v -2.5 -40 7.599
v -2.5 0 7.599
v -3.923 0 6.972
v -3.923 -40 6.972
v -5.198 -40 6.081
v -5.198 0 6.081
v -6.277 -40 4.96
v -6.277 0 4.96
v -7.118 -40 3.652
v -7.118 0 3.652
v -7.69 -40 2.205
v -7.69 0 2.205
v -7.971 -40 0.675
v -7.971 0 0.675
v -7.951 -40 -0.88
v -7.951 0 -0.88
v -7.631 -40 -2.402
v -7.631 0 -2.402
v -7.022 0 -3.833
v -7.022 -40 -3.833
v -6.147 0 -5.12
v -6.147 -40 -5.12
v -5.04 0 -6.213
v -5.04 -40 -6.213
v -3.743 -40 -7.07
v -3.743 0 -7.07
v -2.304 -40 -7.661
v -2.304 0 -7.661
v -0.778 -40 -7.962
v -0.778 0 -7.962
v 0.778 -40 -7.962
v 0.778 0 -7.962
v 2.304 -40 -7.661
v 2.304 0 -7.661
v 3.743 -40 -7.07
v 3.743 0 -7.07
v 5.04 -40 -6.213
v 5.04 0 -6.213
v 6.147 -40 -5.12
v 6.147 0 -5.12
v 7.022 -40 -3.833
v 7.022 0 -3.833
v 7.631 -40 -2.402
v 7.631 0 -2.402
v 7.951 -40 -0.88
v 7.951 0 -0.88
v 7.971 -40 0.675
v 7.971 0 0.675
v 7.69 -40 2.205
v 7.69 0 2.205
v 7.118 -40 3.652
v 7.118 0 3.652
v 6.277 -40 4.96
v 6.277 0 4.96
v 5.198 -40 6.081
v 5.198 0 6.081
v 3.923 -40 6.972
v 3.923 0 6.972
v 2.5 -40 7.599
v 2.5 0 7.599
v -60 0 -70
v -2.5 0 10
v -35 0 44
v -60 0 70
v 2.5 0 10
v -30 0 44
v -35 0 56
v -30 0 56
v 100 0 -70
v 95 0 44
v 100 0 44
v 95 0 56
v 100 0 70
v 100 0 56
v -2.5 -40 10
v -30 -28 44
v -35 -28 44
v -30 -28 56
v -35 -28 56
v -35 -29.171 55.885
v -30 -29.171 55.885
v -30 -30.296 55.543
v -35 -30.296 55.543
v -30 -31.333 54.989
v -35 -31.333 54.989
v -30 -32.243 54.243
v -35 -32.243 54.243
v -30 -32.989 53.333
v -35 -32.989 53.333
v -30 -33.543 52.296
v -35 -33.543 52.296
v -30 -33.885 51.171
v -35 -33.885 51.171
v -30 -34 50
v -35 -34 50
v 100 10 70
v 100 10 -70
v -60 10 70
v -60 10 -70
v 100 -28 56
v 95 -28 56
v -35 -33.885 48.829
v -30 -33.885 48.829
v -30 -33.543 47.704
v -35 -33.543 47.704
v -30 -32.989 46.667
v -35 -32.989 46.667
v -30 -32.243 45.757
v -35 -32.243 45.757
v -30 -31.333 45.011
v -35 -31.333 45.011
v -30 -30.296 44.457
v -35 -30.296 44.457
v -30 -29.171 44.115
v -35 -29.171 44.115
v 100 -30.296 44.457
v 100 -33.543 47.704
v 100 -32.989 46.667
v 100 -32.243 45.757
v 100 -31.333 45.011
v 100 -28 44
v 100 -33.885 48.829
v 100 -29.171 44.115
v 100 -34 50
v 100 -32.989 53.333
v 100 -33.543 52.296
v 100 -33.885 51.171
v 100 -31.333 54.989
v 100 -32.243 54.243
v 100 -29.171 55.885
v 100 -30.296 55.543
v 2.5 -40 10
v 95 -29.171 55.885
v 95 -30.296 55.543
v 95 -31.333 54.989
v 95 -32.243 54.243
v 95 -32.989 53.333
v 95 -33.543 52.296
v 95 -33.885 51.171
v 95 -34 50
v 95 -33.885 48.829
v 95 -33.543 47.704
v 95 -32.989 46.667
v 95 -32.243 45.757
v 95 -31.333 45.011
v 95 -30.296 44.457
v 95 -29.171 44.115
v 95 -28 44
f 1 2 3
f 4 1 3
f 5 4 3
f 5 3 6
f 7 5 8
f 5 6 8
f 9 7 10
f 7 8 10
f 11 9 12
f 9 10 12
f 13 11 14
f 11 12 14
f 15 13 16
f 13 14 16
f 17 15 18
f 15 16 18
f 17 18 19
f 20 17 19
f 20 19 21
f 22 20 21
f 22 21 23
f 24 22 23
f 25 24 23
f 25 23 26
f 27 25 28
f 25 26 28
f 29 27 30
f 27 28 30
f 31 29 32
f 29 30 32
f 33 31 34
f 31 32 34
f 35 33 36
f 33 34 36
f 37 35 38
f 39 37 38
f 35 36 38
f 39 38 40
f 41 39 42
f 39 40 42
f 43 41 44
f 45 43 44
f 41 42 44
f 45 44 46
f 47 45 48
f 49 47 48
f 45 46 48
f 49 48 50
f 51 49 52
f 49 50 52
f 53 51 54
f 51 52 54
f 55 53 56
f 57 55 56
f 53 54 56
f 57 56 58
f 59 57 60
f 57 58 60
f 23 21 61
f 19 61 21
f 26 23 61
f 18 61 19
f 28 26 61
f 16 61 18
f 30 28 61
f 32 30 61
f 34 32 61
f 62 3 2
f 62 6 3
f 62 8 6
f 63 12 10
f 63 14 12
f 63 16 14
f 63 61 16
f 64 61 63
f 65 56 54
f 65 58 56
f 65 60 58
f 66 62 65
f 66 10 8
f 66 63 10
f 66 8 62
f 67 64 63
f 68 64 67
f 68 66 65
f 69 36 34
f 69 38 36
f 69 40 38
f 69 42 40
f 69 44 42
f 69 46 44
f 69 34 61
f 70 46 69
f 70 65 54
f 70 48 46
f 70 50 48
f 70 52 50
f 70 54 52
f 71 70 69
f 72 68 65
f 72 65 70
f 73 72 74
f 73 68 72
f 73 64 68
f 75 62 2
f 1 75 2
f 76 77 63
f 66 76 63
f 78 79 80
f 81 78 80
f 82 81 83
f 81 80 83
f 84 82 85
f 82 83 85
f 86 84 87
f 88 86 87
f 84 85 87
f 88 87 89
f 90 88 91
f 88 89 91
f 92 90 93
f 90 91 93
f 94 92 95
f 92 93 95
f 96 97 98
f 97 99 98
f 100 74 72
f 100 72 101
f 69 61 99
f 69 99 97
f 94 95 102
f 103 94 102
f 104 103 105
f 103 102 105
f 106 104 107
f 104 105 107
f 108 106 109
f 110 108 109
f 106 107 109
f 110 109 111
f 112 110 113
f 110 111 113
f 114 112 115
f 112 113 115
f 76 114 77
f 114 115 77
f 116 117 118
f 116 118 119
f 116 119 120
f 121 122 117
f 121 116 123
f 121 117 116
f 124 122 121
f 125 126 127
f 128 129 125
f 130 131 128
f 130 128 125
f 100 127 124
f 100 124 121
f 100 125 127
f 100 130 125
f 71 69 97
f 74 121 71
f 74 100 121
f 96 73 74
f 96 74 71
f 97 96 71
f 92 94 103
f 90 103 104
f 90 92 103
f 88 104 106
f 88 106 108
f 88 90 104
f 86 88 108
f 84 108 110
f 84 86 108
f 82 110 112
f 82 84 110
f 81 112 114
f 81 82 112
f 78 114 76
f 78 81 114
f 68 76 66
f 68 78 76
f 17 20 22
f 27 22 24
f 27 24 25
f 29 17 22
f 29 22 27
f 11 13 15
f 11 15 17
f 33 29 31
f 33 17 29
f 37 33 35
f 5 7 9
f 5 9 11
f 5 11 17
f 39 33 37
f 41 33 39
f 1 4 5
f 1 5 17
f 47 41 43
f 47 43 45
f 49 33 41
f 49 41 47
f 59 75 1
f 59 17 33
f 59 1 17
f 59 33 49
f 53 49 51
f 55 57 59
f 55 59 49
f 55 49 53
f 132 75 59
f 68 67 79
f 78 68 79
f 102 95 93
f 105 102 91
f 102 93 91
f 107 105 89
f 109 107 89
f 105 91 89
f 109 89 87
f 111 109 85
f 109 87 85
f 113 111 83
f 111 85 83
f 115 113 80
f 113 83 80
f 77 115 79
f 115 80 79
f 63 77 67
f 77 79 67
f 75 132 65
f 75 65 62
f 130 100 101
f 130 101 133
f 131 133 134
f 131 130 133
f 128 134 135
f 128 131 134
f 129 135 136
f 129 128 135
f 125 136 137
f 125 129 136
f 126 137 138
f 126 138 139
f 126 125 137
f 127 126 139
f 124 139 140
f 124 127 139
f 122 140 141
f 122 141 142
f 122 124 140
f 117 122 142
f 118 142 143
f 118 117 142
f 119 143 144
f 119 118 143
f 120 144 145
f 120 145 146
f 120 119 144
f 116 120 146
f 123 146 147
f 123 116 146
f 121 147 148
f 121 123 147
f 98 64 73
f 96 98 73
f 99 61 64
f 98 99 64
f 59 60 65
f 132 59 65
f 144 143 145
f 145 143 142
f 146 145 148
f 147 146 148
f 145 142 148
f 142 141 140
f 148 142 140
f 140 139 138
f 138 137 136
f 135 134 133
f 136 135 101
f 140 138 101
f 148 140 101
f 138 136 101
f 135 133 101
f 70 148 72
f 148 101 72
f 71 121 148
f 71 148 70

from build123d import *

# Parameters (mm, degrees)
F0_W     = 160
F0_H     = 140
F1_DEPTH = 10
F3_DEPTH = 40
F5_DEPTH = 5
F8_DEPTH = 5


with BuildPart() as f1:
    # F0 (on Front) → F1 (new body)
    with BuildSketch(Plane.XZ):
        with Locations((20, 0)):
            Rectangle(F0_W, F0_H)
    extrude(amount=-F1_DEPTH)

    # F2 (on face) → F3 (join)
    with BuildSketch(Plane.XZ):
        with BuildLine():
            Line((-2.5, 10), (-2.5, 7.5993420768))
            ThreePointArc((-2.5, 7.5993420768), (0, -8), (2.5, 7.5993420768))
            Line((2.5, 7.5993420768), (2.5, 10))
            Line((2.5, 10), (-2.5, 10))
        make_face()
    extrude(amount=F3_DEPTH)

    # F4 (on face) → F5 (join)
    with BuildSketch(Plane.YZ.offset(100)):
        with BuildLine():
            ThreePointArc((-28, 56), (-34, 50), (-28, 44))
            Line((-28, 44), (10, 44))
            Line((10, 44), (10, 56))
            Line((10, 56), (-28, 56))
        make_face()
    extrude(amount=-F5_DEPTH)

    # F7 (on offset) → F8 (join)
    with BuildSketch(Plane.YZ.offset(-35)):
        with BuildLine():
            Line((10, 56), (-28, 56))
            ThreePointArc((-28, 56), (-32.2426406871, 54.2426406871), (-34, 50))
            Line((-34, 50), (10, 50))
            Line((10, 50), (10, 56))
        make_face()
        with BuildLine():
            Line((10, 50), (-34, 50))
            ThreePointArc((-34, 50), (-32.2426406871, 45.7573593129), (-28, 44))
            Line((-28, 44), (10, 44))
            Line((10, 44), (10, 50))
        make_face()
    extrude(amount=F8_DEPTH)


solid = f1.part
